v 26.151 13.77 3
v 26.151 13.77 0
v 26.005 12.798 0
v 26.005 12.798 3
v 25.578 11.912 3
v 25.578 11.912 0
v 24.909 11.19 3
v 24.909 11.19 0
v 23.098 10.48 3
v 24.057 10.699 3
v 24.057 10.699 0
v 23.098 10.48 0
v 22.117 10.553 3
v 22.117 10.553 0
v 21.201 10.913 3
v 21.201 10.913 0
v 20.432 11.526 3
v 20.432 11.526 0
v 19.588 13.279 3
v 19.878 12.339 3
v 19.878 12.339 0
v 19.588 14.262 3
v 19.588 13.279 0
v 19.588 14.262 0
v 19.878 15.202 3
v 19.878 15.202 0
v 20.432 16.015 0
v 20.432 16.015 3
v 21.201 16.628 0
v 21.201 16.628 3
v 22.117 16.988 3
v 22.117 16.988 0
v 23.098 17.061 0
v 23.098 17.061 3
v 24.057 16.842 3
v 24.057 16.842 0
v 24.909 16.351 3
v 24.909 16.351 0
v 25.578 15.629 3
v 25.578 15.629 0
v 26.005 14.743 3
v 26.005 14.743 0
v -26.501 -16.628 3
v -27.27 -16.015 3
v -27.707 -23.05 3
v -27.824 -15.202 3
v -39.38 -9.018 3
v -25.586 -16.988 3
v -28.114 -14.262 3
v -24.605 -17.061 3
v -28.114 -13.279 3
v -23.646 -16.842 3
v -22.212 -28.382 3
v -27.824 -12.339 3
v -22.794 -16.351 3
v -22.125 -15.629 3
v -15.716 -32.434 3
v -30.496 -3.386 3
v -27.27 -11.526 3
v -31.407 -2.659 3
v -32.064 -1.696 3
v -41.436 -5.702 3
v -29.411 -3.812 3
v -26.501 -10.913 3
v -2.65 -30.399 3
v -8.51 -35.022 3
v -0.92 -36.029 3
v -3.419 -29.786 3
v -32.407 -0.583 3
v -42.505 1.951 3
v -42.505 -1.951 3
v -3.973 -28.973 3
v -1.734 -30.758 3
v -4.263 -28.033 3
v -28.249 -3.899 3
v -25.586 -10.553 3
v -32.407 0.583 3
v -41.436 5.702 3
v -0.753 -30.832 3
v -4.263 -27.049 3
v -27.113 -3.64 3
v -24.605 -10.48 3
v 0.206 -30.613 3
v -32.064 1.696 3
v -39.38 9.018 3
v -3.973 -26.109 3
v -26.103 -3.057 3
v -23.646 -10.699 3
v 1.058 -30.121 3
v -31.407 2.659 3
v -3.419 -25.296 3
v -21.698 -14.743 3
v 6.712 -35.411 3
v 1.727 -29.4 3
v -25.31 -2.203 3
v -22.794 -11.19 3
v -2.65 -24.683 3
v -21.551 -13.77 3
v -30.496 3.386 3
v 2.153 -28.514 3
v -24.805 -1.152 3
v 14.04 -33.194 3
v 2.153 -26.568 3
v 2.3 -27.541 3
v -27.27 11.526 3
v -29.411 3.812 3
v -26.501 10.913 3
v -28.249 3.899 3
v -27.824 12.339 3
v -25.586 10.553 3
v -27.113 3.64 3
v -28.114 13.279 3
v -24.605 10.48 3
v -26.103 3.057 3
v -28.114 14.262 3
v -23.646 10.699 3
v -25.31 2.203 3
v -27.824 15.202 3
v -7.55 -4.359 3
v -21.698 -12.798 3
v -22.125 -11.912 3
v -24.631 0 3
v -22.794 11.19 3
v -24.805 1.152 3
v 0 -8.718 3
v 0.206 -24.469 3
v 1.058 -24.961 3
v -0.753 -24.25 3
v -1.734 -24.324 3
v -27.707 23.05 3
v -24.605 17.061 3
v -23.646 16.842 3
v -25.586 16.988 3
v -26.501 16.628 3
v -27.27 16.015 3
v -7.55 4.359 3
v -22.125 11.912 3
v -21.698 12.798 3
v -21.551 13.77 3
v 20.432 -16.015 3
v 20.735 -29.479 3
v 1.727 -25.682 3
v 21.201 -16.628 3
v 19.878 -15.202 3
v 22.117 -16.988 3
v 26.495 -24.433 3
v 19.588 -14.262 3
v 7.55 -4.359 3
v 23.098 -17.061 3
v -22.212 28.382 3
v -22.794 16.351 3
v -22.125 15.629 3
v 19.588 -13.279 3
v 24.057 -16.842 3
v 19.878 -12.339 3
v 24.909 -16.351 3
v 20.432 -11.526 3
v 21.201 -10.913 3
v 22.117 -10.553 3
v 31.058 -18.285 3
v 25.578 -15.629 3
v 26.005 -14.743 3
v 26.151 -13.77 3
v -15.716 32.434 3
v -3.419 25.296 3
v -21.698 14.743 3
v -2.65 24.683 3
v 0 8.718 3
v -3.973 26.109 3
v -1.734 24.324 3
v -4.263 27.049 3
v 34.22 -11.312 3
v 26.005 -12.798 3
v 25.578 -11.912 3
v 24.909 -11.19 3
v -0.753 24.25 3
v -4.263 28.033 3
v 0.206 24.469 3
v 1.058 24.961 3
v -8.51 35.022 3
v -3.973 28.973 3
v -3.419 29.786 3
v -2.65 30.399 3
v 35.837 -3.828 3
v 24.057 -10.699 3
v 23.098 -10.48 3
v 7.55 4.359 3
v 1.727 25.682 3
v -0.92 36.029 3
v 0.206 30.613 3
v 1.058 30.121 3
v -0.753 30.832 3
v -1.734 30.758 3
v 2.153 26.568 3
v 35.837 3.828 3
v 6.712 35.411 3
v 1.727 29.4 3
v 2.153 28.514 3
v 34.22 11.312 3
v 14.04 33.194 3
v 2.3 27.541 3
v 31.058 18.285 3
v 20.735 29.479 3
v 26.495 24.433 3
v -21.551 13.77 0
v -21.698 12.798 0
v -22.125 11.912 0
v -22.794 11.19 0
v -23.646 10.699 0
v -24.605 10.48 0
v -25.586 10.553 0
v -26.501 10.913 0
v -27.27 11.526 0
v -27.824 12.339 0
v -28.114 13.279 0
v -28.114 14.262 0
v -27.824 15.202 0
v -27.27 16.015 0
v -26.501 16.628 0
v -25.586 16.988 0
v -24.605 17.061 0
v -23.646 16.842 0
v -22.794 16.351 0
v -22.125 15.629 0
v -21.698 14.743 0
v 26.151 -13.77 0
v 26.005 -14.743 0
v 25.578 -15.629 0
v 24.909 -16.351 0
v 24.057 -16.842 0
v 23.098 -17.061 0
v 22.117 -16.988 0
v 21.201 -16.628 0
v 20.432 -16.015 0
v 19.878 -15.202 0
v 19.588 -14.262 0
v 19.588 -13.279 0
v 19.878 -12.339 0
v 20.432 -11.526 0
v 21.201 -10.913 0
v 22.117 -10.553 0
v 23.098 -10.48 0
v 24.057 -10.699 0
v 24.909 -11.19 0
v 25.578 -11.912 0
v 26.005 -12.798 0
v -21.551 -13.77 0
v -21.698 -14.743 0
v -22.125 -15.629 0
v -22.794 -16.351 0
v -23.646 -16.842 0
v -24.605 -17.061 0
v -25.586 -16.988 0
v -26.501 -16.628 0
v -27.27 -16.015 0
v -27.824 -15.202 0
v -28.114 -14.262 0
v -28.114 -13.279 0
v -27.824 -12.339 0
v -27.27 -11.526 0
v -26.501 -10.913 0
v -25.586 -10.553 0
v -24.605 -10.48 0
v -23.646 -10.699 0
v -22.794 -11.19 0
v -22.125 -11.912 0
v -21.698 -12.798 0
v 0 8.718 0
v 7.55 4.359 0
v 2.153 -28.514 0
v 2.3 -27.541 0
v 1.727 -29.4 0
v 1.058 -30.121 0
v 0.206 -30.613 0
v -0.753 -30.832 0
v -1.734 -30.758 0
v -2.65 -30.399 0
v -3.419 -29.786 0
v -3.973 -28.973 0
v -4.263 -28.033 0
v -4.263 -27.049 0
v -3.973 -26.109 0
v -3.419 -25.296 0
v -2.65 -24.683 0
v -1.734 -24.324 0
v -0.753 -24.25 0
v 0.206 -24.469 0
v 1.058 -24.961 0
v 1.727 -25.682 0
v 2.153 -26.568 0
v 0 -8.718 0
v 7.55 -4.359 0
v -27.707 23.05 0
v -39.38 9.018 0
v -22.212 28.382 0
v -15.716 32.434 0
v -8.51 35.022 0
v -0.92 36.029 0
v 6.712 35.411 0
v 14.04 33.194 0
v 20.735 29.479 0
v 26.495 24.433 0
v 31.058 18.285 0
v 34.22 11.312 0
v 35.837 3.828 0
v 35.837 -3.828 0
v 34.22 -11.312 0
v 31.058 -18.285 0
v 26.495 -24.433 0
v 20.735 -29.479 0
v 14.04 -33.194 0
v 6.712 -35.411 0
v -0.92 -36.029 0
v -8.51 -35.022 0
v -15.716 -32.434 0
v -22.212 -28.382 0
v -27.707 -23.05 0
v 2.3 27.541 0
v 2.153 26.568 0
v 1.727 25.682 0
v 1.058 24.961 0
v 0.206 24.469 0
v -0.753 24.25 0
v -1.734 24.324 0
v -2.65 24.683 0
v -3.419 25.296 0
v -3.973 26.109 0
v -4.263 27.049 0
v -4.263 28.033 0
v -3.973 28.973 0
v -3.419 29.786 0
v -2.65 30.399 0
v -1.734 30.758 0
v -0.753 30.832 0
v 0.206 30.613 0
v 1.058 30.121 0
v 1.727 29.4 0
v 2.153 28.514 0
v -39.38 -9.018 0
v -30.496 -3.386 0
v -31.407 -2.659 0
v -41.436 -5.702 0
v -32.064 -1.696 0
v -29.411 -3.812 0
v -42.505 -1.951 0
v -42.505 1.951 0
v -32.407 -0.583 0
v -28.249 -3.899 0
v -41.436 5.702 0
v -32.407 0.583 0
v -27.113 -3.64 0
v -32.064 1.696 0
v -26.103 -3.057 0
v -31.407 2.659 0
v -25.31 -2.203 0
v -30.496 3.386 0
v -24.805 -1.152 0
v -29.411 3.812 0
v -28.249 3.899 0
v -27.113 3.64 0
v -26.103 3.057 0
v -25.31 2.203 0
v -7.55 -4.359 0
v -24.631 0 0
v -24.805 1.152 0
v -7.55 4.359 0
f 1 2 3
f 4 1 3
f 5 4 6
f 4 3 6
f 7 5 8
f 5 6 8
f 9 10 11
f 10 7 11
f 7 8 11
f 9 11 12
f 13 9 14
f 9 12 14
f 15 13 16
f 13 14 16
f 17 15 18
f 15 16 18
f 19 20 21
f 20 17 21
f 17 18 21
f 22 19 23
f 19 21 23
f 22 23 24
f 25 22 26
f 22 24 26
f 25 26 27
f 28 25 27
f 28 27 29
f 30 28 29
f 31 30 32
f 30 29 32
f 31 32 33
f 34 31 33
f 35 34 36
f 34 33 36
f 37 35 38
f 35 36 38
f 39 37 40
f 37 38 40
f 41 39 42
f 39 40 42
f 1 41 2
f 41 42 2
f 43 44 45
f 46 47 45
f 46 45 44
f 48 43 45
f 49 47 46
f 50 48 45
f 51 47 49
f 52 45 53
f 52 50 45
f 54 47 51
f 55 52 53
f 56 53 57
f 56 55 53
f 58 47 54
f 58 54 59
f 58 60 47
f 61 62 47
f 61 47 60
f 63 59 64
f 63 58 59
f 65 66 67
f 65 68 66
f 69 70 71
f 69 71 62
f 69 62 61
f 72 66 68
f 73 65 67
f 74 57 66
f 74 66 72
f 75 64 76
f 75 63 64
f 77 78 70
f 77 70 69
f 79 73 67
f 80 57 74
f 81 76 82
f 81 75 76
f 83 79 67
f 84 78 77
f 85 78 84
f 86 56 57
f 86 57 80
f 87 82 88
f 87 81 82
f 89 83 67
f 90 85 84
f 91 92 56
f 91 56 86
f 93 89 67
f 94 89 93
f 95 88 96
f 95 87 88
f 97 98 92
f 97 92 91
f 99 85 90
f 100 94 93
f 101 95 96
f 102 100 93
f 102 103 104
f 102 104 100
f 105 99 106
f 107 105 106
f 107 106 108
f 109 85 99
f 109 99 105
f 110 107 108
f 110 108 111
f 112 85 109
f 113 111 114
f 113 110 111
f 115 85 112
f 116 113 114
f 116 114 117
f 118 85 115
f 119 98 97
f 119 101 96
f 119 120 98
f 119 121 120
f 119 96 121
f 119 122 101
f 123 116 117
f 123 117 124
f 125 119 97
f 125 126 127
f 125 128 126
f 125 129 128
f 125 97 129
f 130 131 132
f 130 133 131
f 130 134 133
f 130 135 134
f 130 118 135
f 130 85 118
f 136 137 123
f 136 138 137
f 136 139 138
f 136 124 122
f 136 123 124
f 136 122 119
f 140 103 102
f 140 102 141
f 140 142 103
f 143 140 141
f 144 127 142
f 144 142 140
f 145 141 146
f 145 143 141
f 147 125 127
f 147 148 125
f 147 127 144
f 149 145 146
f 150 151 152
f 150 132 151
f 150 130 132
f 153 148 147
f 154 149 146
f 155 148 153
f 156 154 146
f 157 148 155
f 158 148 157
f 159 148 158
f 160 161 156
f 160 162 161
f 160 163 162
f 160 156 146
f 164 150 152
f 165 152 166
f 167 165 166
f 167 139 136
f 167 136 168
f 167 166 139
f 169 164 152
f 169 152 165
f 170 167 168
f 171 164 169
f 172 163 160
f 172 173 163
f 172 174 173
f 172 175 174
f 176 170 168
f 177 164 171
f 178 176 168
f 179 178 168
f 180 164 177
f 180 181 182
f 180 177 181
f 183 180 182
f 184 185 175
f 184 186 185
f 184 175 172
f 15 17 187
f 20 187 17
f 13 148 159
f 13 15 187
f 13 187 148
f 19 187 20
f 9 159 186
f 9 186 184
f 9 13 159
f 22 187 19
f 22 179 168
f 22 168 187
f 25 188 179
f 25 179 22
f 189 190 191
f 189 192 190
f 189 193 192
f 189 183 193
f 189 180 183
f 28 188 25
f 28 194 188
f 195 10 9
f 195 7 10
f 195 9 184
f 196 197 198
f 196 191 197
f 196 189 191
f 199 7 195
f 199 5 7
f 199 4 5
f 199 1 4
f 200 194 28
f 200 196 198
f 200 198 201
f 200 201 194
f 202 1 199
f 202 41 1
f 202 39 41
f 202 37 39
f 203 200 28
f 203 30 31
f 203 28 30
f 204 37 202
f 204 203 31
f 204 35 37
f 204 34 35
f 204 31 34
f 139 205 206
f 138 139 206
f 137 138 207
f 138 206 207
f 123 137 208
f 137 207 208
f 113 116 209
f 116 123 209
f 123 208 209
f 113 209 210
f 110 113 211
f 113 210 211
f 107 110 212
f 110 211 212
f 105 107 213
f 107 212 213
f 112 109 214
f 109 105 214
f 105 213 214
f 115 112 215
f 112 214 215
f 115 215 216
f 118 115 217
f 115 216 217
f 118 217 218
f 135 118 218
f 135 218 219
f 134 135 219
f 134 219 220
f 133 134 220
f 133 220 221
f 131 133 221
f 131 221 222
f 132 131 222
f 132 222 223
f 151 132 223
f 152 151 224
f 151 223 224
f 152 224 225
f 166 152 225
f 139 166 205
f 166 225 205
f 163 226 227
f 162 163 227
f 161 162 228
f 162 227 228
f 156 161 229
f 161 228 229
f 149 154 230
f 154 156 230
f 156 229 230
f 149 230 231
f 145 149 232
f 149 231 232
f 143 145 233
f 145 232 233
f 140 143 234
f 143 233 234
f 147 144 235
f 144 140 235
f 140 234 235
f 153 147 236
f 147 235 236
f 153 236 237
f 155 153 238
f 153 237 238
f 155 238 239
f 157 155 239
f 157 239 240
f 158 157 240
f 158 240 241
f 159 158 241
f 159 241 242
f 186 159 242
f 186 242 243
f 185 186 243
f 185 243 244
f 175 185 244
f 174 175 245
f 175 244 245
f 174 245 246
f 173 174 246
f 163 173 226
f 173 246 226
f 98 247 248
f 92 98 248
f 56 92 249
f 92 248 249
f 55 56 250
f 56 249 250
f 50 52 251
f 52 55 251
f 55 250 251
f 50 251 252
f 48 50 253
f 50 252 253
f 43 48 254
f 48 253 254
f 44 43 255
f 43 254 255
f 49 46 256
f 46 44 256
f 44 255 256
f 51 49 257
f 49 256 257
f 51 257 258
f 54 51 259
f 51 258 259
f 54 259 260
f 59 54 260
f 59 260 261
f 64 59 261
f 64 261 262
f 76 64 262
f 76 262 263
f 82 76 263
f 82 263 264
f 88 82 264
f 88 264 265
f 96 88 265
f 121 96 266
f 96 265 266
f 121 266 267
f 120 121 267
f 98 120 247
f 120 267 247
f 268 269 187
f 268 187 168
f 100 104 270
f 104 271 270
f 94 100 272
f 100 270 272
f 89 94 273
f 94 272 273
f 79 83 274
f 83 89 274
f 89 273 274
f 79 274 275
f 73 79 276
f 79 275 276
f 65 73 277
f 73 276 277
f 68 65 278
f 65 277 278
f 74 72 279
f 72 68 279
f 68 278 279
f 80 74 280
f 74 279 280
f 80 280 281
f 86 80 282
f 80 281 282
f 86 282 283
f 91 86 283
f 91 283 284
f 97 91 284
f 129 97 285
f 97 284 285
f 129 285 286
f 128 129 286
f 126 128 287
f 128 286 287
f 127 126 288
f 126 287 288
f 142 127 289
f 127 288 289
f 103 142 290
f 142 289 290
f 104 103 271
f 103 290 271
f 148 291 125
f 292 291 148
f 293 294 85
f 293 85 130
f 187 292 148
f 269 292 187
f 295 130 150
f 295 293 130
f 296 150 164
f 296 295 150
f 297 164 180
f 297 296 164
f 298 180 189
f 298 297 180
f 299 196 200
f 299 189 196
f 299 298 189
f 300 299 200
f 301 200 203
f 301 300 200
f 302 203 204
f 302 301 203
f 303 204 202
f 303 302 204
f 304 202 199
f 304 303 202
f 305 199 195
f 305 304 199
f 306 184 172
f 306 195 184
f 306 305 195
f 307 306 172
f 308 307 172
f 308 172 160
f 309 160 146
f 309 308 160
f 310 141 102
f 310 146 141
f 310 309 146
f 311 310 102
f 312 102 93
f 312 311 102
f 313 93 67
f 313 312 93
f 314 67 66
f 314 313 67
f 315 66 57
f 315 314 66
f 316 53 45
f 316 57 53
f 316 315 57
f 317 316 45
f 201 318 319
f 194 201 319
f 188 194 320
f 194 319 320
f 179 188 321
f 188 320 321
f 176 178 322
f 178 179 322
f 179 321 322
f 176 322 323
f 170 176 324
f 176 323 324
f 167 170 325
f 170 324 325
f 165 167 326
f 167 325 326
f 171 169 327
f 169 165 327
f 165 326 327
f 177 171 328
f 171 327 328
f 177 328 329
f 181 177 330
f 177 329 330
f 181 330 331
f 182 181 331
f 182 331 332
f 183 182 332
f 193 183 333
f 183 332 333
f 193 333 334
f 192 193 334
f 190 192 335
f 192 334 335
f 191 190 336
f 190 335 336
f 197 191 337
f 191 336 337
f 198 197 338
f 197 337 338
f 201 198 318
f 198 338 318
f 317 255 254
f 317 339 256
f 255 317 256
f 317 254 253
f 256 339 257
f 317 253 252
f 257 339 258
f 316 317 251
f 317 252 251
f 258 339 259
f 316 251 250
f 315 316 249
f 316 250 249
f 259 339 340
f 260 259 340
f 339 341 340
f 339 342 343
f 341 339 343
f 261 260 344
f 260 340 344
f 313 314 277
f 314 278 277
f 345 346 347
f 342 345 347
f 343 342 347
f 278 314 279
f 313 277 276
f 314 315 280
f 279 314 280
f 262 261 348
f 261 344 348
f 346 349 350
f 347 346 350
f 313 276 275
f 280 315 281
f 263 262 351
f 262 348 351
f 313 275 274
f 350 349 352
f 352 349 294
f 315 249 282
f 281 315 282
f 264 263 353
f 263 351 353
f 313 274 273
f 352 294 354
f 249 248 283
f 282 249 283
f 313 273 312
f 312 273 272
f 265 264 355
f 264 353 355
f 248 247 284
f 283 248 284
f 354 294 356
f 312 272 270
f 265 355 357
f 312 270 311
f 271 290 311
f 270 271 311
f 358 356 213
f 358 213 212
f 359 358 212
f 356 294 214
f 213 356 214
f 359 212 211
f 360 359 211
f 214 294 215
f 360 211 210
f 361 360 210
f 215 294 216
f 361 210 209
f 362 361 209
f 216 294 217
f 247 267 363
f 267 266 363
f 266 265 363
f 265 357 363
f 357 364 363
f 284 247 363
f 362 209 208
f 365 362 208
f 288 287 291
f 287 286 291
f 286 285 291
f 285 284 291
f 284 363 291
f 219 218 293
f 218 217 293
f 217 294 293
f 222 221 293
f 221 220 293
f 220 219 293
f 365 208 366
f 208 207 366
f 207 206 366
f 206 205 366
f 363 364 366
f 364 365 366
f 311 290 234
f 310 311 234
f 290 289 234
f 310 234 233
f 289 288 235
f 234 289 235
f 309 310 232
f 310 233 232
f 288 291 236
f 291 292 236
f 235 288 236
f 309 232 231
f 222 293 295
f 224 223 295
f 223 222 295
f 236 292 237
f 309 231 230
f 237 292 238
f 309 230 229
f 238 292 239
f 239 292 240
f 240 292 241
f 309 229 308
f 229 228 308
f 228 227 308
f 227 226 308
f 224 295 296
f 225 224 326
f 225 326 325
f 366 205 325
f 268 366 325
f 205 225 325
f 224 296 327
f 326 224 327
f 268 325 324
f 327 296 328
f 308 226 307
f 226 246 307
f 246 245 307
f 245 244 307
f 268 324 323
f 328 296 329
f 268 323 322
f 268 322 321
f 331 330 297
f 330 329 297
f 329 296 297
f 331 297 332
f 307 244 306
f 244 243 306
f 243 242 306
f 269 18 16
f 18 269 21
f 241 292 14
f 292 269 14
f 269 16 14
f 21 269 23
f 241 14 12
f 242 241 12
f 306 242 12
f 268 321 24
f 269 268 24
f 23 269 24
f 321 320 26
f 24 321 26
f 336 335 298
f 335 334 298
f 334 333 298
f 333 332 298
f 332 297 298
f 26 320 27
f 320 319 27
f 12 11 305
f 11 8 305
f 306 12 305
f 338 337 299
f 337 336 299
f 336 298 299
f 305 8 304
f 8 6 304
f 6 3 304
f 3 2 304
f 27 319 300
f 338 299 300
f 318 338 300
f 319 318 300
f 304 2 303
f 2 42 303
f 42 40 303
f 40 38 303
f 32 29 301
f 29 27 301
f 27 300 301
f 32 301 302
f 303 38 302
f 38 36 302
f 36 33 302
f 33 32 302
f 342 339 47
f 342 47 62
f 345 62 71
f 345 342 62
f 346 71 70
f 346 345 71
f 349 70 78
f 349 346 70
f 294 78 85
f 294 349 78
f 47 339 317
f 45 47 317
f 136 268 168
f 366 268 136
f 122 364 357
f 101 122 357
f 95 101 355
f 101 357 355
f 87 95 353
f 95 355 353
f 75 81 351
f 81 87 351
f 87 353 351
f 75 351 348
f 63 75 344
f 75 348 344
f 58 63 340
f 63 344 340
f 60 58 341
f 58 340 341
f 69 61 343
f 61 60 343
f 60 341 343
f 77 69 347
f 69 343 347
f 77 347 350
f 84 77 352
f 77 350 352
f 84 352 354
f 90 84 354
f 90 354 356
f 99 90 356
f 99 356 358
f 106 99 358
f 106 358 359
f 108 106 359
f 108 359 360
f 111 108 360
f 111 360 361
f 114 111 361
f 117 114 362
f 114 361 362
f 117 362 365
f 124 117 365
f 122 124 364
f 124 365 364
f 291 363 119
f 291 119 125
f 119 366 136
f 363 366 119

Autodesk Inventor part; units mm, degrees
ref_plane "YZ Plane" through (0, 0, 0) normal (1, 0, 0) x (0, 1, 0)
ref_plane "XZ Plane" through (0, 0, 0) normal (0, 1, 0) x (-1, 0, 0)
ref_plane "XY Plane" through (0, 0, 0) normal (0, 0, 1) x (1, 0, 0)
sketch "Sketch1" plane through (0, 0, 0) normal (0, 0, 1) x (1, 0, 0)
  circle A0 centre (-1, 0) radius 36.041 construction
  circle A1 centre (-28.541, 0) radius 8.5 construction
  circle A2 centre (-1, 0) radius 27.541 construction
  circle A3 centre (-1, 27.541) radius 3.3
  circle A4 centre (-1, 0) radius 41.641 construction
  arc A5 (-39.3804, 9.0176) -> (-39.3804, -9.0176) centre (-28.541, 0) ccw
  line L0 (-39.3804, 9.0176) -> (-27.7067, 23.0498)
  line L1 (-39.3804, -9.0176) -> (-27.7067, -23.0498)
  line L2 (0, 0) -> (-50.0981, 0) construction
  arc A6 (-27.7067, -23.0498) -> (-27.7067, 23.0498) centre (0, 0) ccw
  circle A7 centre (-24.8512, 13.7705) radius 3.3
  circle A8 centre (-24.8512, -13.7705) radius 3.3
  circle A9 centre (-1, -27.541) radius 3.3
  circle A10 centre (22.8512, -13.7705) radius 3.3
  circle A11 centre (22.8512, 13.7705) radius 3.3
  line L3 (0, 7.3323) -> (6.35, 3.6662) construction
  line L4 (6.35, 3.6662) -> (6.35, -3.6662) construction
  line L5 (6.35, -3.6662) -> (0, -7.3323) construction
  line L6 (0, -7.3323) -> (-6.35, -3.6662) construction
  line L7 (-6.35, -3.6662) -> (-6.35, 3.6662) construction
  line L8 (-6.35, 3.6662) -> (0, 7.3323) construction
  line L9 (7.55, 4.359) -> (0, 8.718)
  line L10 (0, 8.718) -> (-7.55, 4.359)
  line L11 (-7.55, 4.359) -> (-7.55, -4.359)
  line L12 (-7.55, -4.359) -> (0, -8.718)
  line L13 (0, -8.718) -> (7.55, -4.359)
  line L14 (7.55, -4.359) -> (7.55, 4.359)
  circle A12 centre (-28.541, 0) radius 3.91
  dimension "d2" = 72.082
  dimension "d3" = 17
  dimension "d5" = 6.6
  dimension "d7" = 360
  dimension "d8" = 12.7
  dimension "d9" = 1.2
  dimension "d11" = 7.82
  dimension "d18" = 7.5
  dimension "d19" = 5.6
extrude "Extrusion1" add sketch "Sketch1" along normal blind 3
properties part number "GenevaDrive2" material "Plywood, Finish"
